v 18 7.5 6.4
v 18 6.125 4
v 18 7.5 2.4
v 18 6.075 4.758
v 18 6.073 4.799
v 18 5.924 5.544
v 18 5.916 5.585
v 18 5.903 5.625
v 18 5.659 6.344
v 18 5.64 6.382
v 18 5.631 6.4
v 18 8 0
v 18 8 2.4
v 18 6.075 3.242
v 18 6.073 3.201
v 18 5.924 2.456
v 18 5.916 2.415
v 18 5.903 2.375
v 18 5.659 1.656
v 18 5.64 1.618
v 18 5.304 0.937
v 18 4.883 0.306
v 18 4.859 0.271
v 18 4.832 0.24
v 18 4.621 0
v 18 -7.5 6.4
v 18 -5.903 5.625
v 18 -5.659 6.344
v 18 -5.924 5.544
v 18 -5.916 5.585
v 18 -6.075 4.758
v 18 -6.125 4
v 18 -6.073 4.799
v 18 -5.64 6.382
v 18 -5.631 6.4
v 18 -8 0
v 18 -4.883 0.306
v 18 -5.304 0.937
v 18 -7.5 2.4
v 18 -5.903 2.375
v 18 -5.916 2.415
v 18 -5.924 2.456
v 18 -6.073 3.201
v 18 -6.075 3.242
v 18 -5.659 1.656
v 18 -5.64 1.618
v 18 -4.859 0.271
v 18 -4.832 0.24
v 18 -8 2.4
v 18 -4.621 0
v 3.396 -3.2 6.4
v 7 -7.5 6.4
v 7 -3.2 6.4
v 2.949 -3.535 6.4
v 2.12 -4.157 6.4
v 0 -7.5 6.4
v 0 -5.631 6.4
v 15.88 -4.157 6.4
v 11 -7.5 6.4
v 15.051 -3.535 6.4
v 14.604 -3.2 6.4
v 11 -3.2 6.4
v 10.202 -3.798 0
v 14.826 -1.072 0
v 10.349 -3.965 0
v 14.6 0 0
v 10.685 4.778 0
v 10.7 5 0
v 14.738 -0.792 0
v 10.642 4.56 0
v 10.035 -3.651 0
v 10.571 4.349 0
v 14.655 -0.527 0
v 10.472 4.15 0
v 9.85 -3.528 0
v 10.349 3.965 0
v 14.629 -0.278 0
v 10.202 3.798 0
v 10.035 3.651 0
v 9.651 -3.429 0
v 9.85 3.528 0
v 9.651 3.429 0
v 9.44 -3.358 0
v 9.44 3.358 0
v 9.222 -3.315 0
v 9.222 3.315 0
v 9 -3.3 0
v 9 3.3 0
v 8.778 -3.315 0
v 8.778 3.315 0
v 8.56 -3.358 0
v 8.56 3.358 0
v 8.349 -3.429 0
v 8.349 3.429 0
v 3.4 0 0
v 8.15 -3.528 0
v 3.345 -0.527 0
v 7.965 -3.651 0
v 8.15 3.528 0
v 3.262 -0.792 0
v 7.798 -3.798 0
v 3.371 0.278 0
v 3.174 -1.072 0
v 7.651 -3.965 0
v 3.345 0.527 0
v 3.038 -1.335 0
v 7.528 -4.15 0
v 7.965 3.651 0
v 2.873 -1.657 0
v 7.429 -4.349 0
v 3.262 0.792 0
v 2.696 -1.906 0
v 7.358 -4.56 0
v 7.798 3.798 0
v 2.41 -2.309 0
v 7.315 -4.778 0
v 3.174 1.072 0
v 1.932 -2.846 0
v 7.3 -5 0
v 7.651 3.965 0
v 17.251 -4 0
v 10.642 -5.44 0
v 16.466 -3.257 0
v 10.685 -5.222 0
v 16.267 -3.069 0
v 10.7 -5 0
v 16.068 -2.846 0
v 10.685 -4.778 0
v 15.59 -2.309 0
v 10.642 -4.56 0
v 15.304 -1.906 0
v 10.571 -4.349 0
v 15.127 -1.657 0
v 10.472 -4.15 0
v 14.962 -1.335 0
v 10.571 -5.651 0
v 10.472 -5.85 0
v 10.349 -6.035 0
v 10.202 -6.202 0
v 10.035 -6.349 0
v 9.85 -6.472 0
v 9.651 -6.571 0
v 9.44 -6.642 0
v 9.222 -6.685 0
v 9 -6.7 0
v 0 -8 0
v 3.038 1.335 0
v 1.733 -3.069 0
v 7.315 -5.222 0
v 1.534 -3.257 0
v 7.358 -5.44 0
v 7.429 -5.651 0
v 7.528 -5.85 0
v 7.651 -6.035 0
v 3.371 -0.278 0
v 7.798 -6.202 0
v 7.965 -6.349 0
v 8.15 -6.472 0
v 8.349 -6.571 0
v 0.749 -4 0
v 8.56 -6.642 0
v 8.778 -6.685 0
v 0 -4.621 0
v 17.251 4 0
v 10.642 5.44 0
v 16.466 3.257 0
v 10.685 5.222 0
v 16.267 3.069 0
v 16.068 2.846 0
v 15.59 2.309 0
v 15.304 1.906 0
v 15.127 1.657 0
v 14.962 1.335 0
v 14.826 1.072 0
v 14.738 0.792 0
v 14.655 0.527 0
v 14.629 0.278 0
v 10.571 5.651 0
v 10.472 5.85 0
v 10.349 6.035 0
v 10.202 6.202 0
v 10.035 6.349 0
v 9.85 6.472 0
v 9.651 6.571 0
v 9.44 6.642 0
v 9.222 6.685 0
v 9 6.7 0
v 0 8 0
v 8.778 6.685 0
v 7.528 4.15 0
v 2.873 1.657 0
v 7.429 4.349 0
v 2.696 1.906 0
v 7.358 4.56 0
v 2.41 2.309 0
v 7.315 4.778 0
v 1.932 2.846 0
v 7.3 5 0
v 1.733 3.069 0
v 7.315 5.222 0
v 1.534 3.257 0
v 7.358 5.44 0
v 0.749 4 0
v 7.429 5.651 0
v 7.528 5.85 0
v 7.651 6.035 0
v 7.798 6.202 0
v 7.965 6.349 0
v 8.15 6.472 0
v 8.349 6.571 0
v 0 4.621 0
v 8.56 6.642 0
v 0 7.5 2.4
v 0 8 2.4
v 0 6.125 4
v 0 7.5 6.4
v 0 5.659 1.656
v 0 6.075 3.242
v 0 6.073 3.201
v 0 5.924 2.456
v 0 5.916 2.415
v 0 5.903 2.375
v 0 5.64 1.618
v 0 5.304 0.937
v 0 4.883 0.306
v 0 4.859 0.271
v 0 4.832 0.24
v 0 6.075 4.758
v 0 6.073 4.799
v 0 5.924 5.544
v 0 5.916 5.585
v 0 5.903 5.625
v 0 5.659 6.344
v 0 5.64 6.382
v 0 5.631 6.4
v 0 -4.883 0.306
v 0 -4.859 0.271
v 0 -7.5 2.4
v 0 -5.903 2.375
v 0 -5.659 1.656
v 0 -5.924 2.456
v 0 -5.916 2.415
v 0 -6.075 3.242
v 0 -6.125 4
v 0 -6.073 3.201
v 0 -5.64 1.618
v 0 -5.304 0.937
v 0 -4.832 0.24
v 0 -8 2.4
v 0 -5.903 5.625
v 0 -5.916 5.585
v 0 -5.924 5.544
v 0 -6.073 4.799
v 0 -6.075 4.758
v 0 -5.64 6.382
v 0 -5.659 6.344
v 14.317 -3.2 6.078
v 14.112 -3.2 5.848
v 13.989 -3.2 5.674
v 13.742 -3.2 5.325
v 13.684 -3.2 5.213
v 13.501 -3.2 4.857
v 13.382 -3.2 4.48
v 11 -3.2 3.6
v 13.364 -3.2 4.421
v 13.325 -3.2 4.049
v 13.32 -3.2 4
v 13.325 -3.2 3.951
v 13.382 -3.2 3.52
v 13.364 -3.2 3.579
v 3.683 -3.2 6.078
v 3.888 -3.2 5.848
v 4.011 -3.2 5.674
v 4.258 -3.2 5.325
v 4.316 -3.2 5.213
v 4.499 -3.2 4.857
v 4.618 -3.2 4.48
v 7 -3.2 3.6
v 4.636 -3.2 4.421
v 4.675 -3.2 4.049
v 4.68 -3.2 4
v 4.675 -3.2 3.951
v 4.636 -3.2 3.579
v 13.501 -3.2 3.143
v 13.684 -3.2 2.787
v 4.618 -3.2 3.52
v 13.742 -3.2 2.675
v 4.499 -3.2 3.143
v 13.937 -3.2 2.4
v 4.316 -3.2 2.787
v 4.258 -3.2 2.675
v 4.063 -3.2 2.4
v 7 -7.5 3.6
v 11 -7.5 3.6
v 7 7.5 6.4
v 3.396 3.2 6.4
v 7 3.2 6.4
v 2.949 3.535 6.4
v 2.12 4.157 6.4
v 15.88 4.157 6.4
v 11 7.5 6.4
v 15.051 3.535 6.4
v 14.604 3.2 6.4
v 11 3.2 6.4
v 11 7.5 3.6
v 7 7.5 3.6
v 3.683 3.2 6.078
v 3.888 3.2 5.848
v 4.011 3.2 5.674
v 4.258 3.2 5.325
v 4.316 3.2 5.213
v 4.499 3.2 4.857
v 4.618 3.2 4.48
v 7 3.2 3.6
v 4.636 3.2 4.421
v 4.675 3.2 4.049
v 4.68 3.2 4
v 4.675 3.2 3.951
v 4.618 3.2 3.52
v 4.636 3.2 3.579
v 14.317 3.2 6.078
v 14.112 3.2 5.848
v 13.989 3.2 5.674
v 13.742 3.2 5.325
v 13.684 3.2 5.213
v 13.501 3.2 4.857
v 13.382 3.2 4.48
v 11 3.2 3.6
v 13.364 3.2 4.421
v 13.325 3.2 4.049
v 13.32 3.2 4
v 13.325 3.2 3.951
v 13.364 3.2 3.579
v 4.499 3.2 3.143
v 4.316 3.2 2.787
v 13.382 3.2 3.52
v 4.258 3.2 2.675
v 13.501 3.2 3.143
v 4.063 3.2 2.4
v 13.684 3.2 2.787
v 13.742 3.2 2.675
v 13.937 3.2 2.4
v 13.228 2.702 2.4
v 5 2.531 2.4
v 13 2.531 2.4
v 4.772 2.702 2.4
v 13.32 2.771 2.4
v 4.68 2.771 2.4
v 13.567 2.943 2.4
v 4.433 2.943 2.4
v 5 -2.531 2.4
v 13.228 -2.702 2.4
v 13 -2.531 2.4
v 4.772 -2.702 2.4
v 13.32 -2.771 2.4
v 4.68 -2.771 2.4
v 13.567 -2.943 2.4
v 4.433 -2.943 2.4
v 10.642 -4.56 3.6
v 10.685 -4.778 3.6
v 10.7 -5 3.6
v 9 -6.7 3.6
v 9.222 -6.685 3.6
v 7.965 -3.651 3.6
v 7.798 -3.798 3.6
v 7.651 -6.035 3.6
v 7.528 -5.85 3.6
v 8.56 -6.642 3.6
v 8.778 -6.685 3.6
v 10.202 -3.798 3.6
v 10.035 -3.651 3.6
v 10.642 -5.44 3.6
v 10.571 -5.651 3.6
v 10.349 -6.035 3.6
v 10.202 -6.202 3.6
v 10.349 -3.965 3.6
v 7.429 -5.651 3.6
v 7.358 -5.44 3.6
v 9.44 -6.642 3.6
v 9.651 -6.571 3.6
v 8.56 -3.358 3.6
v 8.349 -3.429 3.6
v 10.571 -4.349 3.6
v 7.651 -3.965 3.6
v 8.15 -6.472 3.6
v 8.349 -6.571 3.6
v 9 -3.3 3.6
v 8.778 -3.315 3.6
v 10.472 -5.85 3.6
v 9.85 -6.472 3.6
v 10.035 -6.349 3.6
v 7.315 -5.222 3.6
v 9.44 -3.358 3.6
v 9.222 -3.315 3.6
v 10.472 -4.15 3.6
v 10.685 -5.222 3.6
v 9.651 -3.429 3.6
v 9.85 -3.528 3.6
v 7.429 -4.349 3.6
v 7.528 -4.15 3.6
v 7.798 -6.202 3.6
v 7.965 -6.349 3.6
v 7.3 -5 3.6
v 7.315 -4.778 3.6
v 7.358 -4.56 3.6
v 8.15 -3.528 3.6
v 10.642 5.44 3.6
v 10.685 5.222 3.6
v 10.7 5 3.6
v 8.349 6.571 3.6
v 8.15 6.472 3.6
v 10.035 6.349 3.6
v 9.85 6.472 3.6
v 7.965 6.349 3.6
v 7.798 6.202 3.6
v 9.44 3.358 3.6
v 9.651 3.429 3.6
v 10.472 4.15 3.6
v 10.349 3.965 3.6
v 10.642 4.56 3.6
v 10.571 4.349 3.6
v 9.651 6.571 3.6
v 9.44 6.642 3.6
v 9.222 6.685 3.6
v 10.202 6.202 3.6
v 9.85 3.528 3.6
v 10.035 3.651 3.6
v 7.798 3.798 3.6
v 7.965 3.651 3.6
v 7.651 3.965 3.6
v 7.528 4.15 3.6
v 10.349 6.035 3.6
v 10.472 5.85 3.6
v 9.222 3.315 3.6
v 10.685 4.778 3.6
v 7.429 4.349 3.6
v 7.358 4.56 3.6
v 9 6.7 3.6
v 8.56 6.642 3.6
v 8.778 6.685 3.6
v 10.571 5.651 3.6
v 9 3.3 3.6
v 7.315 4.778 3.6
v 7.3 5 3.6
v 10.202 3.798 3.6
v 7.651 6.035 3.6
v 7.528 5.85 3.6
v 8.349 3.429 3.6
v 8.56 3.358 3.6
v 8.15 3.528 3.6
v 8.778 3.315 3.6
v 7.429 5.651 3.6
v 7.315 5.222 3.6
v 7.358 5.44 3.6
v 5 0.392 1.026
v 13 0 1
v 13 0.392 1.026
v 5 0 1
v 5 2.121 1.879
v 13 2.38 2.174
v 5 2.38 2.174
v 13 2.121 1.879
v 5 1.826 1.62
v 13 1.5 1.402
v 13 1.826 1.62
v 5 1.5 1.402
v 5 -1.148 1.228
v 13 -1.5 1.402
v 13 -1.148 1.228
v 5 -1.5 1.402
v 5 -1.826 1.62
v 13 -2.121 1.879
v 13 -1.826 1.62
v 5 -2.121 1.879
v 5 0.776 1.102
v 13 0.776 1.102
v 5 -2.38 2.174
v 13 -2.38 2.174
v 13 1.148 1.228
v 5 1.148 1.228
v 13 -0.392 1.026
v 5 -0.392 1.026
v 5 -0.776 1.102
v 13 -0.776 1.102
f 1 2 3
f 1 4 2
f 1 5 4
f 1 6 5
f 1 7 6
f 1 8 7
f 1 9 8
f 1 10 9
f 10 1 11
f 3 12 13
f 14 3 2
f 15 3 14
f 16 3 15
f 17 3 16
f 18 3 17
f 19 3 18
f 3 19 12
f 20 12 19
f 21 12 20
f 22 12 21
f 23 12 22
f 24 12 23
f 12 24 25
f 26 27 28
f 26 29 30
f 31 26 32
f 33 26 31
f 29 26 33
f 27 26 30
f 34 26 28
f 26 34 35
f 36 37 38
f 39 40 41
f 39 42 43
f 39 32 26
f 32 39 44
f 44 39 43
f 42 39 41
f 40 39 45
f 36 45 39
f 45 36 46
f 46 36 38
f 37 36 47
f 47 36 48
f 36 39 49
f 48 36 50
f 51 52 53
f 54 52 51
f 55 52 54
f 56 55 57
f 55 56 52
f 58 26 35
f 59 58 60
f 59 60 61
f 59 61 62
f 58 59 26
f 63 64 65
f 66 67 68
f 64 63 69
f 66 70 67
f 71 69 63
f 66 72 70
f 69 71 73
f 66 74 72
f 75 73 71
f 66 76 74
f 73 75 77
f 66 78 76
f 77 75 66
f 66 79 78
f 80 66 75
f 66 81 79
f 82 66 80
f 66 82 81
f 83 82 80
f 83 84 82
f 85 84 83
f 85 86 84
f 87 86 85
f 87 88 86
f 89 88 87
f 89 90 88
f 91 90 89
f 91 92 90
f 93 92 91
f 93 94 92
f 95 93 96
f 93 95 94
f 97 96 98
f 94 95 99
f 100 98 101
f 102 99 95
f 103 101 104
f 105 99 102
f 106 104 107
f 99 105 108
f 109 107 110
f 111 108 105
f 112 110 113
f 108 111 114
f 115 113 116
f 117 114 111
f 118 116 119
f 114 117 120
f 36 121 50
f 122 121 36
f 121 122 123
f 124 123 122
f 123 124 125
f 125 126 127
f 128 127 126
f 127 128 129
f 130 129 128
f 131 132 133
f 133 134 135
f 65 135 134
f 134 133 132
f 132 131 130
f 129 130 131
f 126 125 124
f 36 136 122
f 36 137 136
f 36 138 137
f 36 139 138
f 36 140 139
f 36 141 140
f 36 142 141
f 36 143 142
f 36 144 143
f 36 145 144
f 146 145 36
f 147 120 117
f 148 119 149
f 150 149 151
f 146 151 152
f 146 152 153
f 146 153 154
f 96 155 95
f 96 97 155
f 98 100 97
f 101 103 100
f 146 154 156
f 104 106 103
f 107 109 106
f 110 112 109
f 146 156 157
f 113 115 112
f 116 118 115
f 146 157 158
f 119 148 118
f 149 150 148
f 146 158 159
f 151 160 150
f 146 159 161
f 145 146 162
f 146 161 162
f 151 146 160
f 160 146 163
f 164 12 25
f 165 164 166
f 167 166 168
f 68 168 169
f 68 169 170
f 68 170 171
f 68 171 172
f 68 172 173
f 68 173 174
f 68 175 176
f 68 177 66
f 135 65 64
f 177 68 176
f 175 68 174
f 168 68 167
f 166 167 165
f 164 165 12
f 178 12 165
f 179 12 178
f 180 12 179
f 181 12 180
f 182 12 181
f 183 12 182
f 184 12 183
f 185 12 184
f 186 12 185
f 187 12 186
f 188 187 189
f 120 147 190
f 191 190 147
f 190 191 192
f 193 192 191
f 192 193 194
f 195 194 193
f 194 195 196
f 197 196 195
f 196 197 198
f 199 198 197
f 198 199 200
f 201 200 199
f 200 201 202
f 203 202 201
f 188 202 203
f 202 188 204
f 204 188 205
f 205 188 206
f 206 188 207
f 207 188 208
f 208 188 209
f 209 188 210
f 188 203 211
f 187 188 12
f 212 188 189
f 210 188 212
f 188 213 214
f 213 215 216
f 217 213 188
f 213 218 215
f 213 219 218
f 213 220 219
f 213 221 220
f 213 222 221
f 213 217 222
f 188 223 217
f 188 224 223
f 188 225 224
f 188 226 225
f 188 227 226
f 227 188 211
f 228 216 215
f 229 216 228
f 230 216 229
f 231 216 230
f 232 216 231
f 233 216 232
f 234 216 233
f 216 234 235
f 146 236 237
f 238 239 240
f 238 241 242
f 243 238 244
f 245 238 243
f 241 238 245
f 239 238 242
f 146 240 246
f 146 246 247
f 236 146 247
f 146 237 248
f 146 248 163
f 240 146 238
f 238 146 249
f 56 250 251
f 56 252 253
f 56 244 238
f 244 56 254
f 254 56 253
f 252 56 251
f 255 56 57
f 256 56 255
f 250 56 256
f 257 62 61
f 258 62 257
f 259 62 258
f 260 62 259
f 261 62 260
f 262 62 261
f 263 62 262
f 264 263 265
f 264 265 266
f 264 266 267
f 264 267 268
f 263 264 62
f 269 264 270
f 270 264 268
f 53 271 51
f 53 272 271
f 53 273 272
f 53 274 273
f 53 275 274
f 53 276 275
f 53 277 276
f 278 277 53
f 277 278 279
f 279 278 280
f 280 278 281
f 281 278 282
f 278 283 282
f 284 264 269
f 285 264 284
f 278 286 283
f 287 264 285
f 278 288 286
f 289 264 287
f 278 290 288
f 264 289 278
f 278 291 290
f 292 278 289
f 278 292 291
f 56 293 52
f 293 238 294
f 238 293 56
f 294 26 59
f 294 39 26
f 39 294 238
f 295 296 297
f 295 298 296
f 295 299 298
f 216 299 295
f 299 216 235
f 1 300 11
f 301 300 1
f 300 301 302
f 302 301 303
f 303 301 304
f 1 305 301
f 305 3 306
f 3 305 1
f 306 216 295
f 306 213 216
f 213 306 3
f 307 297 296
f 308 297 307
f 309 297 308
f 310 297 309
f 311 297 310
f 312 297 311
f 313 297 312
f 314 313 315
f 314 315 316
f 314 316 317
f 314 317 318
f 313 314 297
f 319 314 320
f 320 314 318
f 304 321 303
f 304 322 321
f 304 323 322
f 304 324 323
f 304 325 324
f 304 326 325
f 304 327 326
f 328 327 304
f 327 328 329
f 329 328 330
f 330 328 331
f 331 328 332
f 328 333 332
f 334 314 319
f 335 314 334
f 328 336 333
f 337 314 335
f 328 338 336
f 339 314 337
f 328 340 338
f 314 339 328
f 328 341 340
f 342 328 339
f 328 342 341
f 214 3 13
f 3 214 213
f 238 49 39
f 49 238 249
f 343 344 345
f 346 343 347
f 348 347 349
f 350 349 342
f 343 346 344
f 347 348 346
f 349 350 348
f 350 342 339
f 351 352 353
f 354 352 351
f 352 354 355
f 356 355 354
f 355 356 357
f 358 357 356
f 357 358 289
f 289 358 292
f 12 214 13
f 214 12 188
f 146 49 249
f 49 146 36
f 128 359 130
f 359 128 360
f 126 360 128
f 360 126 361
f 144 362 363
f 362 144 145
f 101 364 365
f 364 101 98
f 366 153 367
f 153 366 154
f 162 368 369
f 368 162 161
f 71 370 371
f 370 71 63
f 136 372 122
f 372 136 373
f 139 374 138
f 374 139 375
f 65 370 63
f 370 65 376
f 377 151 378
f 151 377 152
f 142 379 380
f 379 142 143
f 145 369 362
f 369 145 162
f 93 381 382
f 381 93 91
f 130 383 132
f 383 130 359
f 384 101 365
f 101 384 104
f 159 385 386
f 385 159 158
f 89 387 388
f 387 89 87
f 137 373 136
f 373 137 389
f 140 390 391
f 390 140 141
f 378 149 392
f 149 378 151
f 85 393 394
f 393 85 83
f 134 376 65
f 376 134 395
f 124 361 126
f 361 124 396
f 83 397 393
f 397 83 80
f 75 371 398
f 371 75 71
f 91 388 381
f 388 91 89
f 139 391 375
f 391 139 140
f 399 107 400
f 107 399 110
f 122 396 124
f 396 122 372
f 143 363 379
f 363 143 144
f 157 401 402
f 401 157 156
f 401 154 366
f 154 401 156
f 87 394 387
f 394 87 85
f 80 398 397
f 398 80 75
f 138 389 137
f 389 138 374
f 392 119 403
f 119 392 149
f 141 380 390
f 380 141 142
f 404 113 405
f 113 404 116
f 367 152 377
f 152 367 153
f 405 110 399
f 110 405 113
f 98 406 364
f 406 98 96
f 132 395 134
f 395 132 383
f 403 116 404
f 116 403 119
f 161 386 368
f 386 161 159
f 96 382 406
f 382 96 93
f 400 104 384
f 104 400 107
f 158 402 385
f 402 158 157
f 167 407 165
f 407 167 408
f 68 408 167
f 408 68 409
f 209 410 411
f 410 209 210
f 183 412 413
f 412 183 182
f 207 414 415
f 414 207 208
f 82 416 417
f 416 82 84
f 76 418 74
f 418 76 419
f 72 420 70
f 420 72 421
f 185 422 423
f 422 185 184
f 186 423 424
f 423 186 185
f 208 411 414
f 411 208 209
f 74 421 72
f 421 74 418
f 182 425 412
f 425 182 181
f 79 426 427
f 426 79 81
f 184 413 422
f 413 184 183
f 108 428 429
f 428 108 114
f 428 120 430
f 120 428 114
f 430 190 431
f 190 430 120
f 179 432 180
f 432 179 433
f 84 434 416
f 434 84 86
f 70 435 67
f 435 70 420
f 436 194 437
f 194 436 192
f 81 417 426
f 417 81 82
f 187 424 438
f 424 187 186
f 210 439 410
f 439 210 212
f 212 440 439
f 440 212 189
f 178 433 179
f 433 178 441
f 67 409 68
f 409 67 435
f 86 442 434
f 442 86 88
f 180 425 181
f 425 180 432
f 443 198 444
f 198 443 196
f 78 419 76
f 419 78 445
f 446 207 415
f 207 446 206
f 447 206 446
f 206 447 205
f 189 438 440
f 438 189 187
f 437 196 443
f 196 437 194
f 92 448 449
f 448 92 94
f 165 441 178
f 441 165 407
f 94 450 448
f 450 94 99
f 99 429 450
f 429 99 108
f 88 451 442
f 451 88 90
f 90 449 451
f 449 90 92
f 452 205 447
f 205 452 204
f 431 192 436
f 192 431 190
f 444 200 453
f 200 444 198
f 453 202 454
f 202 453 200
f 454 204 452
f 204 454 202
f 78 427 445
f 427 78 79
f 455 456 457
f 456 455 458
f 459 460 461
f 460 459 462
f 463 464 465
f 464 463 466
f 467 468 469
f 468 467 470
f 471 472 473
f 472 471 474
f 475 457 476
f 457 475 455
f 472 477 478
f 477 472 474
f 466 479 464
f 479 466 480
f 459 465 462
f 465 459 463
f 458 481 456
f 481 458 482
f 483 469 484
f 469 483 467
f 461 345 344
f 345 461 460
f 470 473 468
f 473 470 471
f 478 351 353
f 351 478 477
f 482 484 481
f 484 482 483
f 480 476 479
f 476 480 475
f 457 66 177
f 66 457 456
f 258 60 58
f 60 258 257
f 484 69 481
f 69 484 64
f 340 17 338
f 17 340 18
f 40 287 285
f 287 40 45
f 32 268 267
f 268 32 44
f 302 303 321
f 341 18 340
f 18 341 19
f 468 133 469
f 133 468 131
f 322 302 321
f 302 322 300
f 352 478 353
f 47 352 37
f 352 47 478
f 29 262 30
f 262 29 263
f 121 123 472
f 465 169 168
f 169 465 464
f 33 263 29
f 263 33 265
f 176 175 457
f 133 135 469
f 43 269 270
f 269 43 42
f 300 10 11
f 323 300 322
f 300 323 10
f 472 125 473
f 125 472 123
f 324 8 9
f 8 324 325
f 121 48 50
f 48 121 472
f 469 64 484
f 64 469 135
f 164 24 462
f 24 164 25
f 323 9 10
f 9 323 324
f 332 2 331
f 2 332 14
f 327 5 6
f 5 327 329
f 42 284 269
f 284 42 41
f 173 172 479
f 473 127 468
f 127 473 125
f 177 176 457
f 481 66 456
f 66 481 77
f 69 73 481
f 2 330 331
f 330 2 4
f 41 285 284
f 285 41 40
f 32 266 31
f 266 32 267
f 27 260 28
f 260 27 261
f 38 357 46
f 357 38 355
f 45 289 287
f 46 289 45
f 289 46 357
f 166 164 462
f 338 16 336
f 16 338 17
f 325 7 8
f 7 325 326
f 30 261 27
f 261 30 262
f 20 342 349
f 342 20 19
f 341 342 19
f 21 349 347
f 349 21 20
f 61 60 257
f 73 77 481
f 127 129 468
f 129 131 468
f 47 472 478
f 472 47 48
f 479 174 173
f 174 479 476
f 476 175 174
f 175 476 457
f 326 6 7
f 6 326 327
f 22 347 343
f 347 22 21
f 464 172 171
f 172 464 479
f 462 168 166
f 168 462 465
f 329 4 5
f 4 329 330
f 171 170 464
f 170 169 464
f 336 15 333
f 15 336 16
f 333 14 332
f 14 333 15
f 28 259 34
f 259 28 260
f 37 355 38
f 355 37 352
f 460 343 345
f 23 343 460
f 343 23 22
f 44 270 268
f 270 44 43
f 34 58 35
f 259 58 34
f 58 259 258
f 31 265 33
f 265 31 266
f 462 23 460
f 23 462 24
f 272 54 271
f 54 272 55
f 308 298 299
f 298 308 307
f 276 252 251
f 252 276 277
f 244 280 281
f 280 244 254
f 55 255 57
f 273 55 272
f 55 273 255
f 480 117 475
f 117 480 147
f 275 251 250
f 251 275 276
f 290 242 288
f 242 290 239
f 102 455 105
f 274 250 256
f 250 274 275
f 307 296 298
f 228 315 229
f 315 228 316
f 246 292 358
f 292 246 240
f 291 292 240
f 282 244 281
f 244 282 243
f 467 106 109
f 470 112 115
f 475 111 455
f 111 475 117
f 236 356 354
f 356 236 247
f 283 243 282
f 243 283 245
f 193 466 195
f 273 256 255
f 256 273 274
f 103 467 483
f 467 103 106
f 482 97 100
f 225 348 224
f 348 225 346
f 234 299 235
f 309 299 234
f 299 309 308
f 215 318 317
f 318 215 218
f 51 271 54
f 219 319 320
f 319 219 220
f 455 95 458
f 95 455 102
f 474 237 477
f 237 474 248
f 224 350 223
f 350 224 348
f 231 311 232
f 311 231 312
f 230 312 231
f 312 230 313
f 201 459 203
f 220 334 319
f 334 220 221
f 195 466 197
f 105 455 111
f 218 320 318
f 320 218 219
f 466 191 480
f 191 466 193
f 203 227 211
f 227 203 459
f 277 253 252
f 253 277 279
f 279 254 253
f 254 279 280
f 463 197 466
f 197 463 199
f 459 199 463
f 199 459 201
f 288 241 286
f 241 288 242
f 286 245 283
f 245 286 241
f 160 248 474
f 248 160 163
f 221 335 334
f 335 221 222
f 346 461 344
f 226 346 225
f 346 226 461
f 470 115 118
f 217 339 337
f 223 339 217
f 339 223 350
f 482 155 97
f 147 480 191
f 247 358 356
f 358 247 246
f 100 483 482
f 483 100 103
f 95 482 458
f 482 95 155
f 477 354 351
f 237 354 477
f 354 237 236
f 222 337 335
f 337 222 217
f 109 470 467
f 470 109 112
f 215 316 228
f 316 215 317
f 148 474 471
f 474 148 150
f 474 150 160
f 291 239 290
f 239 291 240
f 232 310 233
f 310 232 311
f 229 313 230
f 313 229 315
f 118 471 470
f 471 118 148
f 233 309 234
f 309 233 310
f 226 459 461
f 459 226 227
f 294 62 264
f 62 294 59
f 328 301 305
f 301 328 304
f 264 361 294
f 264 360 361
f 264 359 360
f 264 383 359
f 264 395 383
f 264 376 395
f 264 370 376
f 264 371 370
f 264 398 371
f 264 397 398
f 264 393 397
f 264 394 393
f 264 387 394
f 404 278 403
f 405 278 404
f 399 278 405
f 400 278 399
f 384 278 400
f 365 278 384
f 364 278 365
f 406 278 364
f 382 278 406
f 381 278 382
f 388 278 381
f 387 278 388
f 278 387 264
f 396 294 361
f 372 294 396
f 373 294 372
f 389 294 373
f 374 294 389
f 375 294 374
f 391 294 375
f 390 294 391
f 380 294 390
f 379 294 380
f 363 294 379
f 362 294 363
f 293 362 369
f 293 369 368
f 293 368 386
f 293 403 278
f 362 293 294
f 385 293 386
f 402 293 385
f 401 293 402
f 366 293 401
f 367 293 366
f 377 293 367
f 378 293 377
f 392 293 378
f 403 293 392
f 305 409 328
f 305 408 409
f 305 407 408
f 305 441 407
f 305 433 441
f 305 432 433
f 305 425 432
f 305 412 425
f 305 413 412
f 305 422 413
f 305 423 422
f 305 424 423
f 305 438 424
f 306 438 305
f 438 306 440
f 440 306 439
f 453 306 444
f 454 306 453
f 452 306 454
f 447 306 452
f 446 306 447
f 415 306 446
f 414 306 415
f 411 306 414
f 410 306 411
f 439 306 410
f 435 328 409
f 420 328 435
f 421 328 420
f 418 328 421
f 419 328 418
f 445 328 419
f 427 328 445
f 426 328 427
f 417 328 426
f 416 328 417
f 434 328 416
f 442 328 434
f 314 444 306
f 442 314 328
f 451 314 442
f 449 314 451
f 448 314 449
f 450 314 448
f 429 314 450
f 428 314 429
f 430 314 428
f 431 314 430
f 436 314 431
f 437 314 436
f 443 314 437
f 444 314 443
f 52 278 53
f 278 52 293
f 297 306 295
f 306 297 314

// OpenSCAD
// =============================================================================
// V6 CABLE CLIP (TPU 95A — print 20: 16 install + spares)
// =============================================================================
// Backlog #18 (2026-07-06): haa +/-40 / kfe +/-109 at trot = ~1e5 flex
// cycles/hour and quadruped harnesses classically die at the hip — the
// zip anchors take cable TENSION but nothing defined the BEND at the
// anchor exits, so the service loop kinks and fatigues at one spot.
//
// This clip is a saddle + BELL-MOUTH horns that sit under the bundle at
// each flex-zone anchor. The existing zip tie does double duty: it
// threads the leg part's zip-pair holes AND this clip's matching holes,
// clamping bundle to clip to leg — no leg reprints, clip retrofits any
// O3.2-pair anchor (10 mm spacing).
//
// Install (4 per leg, both ends of each service loop):
//   coax tunnel-exit pair + femur x44 pair   = the HIP loop (haa+hfe)
//   femur x84 (yoke plate) + tibia x44 pair  = the KNEE loop (kfe)
// Spiral wrap (O6, BOM) covers the free loop BETWEEN clips; loop radius
// >= 40 (8x bundle O5). Assembly checklist: leg_v6 README "cable
// dressing" + tug-test every anchor.
//
// Print: TPU 95A, flat (base down), 100% infill, ~1 g each (LA-28,
// 2026-07-11: was "~2 g" -- measured mesh volume 850.7mm^3 (post LA-24
// wall fix) x TPU 95A density ~1.2 g/cm^3 = ~1.0 g).

$fn = 48;
EPS = 0.05;

L = 18;            // along the cable
W = 16;            // across (holes at +/-5 = the anchor pair spacing 10)
BASE_T = 2.4;
WALL_Z1 = 6.4;
CH_D = 6.0;        // bundle channel (daisy link + VCC spur, ~O5)
CH_Z = 4.0;        // channel axis height -> floor z1, crest z7 (proud of
                   // the walls: the tie wraps the bundle directly)
// LA-24 fix (2026-07-11): the bell-mouth cutters (d2=13 cone, below) reach
// radius 6.125 by the true mouth face (x=0 / x=L) -- against the old
// WALL_Y_OUT=7.2 outer wall edge that left only 1.075mm of wall at the
// flex-critical mouth (< 1.2mm guideline, ray-cast confirmed). Grew the
// OUTER wall profile (not the bore) to 7.5 -> 1.375mm remaining wall at
// both mouths. Still 0.5mm inside the W=16 base half-width (8), so the
// base's own outer lip just shrinks from 0.8 to 0.5mm (non-structural).
WALL_Y_IN  = 3.2;
WALL_Y_OUT = 7.5;
WALL_W = WALL_Y_OUT - WALL_Y_IN;

module cable_clip() {
    difference() {
        union() {
            translate([0, -W/2, 0]) cube([L, W, BASE_T]);
            for (sy = [-1, 1])
                translate([0, min(sy*WALL_Y_IN, sy*WALL_Y_OUT), 0])
                    cube([L, WALL_W, WALL_Z1]);
        }
        // bundle channel
        translate([-1, 0, CH_Z]) rotate([0, 90, 0])
            cylinder(d = CH_D, h = L + 2);
        // bell-mouth horns (the actual bend-radius control): flare to
        // ~2x bundle at both exits so the loop leaves on an arc, never
        // a corner
        translate([L - 5, 0, CH_Z]) rotate([0, 90, 0])
            cylinder(d1 = CH_D, d2 = 13, h = 5.6);
        translate([5, 0, CH_Z]) rotate([0, -90, 0])
            cylinder(d1 = CH_D, d2 = 13, h = 5.6);
        // zip-tie holes — match the leg part's O3.2 pair (tie threads
        // leg + clip together)
        for (sy = [-1, 1])
            translate([L/2, sy*5, -EPS])
                cylinder(d = 3.4, h = WALL_Z1 + 2*EPS);
        // tie groove across the wall tops (tie seats down onto the
        // bundle instead of riding the wall crests)
        translate([L/2 - 2, -W/2 - EPS, 3.6])
            cube([4, W + 2*EPS, WALL_Z1]);
    }
}

cable_clip();
